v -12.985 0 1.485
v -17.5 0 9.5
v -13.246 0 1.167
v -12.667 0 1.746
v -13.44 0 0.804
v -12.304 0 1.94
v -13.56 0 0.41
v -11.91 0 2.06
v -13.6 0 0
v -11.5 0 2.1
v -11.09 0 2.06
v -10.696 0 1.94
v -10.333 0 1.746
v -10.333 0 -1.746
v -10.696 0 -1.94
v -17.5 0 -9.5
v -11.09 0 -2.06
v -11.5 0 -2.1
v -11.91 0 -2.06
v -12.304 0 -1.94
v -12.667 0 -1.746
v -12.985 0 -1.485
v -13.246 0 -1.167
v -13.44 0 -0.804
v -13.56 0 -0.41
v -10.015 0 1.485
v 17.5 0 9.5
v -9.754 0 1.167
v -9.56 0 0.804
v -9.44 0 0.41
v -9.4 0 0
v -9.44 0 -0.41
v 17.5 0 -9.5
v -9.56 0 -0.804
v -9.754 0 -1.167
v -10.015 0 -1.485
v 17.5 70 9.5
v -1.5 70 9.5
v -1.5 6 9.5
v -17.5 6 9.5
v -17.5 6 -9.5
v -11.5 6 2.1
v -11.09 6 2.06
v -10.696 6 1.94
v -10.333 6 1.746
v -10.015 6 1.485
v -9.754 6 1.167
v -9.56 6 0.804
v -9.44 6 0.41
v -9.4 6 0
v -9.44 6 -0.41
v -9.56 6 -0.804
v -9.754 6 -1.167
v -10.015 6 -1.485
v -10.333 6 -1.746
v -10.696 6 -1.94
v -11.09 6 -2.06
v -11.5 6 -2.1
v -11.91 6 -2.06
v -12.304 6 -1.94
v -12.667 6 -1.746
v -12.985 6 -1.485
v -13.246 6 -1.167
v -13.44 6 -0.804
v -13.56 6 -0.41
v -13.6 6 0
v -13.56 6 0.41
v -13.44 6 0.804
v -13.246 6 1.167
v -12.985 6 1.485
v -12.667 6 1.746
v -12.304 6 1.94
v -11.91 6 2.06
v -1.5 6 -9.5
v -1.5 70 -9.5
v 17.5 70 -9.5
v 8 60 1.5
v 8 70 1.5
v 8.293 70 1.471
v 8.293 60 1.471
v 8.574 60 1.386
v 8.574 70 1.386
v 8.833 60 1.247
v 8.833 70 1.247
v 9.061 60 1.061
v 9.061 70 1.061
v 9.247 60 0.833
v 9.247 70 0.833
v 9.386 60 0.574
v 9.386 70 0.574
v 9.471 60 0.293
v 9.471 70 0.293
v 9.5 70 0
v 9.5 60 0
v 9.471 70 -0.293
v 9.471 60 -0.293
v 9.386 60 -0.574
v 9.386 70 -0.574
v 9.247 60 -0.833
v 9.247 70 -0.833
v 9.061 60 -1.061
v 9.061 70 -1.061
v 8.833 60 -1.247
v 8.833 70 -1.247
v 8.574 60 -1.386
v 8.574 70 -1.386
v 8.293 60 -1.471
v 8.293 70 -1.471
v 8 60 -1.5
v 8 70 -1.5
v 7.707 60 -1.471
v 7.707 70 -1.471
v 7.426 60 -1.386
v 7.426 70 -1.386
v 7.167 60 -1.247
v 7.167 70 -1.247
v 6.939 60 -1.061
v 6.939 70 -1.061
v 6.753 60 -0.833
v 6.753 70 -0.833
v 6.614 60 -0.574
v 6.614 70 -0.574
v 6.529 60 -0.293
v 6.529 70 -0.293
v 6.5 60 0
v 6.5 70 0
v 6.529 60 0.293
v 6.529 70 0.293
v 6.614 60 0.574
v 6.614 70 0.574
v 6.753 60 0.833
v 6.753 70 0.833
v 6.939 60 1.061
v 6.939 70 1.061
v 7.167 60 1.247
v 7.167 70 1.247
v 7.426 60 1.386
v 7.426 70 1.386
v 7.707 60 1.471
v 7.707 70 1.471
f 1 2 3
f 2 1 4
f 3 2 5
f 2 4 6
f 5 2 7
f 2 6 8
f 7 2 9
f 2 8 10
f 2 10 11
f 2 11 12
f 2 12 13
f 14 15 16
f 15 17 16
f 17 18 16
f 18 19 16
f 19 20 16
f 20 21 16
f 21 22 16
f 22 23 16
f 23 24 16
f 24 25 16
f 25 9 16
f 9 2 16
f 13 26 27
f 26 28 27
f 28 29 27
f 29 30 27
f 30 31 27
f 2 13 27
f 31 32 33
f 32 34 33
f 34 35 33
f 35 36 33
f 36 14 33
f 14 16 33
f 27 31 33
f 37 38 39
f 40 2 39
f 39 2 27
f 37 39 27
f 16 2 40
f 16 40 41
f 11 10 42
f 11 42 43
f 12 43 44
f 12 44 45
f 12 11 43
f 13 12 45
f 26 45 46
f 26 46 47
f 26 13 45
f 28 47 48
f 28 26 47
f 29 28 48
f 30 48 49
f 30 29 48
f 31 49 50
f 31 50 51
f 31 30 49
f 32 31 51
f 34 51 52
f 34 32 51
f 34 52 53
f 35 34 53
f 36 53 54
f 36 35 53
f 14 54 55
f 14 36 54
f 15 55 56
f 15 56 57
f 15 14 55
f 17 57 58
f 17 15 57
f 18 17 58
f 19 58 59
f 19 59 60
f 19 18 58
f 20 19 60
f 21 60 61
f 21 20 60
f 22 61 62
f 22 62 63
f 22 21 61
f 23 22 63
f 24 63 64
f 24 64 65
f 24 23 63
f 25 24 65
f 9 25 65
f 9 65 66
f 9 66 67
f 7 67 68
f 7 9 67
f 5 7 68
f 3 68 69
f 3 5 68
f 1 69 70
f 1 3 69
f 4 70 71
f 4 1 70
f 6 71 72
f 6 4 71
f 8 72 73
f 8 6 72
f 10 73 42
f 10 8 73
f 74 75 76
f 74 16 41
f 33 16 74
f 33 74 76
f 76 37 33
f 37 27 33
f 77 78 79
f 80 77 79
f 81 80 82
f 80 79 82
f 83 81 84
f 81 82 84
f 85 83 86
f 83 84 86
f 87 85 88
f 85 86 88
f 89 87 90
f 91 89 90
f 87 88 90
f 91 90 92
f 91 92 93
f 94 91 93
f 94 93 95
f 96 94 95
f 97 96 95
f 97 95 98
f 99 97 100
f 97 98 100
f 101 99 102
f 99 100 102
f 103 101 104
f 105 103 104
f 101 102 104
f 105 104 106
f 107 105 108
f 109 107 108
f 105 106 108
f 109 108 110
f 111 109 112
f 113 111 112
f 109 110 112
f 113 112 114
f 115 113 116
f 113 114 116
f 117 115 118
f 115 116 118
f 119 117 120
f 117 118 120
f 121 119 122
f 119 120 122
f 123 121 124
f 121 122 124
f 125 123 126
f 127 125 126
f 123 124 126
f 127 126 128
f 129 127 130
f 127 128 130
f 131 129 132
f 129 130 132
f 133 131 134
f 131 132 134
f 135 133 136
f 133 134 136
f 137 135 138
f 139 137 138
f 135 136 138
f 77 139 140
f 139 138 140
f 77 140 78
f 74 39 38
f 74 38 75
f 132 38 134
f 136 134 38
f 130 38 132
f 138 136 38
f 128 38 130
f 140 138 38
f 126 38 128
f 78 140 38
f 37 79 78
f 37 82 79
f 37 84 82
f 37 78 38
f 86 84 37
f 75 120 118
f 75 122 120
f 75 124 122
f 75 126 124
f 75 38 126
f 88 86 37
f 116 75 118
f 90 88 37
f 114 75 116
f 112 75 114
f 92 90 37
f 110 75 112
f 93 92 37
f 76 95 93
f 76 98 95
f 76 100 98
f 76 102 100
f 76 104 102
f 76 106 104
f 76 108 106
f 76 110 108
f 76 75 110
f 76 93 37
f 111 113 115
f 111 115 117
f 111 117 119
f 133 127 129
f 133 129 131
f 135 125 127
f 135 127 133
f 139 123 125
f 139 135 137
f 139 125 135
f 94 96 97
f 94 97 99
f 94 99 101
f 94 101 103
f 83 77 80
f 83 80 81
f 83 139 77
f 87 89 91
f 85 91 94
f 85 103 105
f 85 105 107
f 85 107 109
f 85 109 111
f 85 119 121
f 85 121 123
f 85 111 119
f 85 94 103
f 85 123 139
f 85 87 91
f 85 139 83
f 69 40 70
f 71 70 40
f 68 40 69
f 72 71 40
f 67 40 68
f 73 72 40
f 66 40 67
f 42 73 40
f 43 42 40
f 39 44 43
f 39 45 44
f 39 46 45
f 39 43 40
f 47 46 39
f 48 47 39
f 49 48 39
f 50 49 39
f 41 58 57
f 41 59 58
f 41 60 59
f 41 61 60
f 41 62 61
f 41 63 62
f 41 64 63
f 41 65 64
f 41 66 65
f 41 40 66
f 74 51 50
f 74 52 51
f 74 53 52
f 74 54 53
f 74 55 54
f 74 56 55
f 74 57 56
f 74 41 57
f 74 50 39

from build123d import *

# Parameters (mm, degrees)
SKETCH_1_W          = 35
SKETCH_1_H          = 19
SKETCH_1_R          = 2.1
EXTRUDE_1_DEPTH     = 6
SKETCH_2_W          = 19
SKETCH_2_H          = 19
EXTRUDE_2_DEPTH     = 64
SKETCH_4_R          = 1.5
CUT_EXTRUDE_1_DEPTH = 10


with BuildPart() as part:
    # 草图1 → 凸台-拉伸1 (new body)
    with BuildSketch(Plane(origin=(0, 0, 0), x_dir=(1, 0, 0), z_dir=(0, 1, 0))):
        Rectangle(SKETCH_1_W, SKETCH_1_H)
        with Locations(Location((-11.5, 0, 0), (0, 0, 270))):
            Circle(SKETCH_1_R, mode=Mode.SUBTRACT)
    extrude(amount=EXTRUDE_1_DEPTH)

    # 草图2 → 凸台-拉伸2 (add)
    with BuildSketch(Plane(origin=(0, 6, 0), x_dir=(1, 0, 0), z_dir=(0, 1, 0))):
        with Locations((8, 0)):
            Rectangle(SKETCH_2_W, SKETCH_2_H)
    extrude(amount=EXTRUDE_2_DEPTH)

    # 草图4 → 切除-拉伸1 (cut)
    with BuildSketch(Plane(origin=(0, 70, 0), x_dir=(1, 0, 0), z_dir=(0, 1, 0))):
        with Locations(Location((8, 0, 0), (0, 0, 270))):
            Circle(SKETCH_4_R)
    extrude(amount=-CUT_EXTRUDE_1_DEPTH, mode=Mode.SUBTRACT)


solid = part.part
